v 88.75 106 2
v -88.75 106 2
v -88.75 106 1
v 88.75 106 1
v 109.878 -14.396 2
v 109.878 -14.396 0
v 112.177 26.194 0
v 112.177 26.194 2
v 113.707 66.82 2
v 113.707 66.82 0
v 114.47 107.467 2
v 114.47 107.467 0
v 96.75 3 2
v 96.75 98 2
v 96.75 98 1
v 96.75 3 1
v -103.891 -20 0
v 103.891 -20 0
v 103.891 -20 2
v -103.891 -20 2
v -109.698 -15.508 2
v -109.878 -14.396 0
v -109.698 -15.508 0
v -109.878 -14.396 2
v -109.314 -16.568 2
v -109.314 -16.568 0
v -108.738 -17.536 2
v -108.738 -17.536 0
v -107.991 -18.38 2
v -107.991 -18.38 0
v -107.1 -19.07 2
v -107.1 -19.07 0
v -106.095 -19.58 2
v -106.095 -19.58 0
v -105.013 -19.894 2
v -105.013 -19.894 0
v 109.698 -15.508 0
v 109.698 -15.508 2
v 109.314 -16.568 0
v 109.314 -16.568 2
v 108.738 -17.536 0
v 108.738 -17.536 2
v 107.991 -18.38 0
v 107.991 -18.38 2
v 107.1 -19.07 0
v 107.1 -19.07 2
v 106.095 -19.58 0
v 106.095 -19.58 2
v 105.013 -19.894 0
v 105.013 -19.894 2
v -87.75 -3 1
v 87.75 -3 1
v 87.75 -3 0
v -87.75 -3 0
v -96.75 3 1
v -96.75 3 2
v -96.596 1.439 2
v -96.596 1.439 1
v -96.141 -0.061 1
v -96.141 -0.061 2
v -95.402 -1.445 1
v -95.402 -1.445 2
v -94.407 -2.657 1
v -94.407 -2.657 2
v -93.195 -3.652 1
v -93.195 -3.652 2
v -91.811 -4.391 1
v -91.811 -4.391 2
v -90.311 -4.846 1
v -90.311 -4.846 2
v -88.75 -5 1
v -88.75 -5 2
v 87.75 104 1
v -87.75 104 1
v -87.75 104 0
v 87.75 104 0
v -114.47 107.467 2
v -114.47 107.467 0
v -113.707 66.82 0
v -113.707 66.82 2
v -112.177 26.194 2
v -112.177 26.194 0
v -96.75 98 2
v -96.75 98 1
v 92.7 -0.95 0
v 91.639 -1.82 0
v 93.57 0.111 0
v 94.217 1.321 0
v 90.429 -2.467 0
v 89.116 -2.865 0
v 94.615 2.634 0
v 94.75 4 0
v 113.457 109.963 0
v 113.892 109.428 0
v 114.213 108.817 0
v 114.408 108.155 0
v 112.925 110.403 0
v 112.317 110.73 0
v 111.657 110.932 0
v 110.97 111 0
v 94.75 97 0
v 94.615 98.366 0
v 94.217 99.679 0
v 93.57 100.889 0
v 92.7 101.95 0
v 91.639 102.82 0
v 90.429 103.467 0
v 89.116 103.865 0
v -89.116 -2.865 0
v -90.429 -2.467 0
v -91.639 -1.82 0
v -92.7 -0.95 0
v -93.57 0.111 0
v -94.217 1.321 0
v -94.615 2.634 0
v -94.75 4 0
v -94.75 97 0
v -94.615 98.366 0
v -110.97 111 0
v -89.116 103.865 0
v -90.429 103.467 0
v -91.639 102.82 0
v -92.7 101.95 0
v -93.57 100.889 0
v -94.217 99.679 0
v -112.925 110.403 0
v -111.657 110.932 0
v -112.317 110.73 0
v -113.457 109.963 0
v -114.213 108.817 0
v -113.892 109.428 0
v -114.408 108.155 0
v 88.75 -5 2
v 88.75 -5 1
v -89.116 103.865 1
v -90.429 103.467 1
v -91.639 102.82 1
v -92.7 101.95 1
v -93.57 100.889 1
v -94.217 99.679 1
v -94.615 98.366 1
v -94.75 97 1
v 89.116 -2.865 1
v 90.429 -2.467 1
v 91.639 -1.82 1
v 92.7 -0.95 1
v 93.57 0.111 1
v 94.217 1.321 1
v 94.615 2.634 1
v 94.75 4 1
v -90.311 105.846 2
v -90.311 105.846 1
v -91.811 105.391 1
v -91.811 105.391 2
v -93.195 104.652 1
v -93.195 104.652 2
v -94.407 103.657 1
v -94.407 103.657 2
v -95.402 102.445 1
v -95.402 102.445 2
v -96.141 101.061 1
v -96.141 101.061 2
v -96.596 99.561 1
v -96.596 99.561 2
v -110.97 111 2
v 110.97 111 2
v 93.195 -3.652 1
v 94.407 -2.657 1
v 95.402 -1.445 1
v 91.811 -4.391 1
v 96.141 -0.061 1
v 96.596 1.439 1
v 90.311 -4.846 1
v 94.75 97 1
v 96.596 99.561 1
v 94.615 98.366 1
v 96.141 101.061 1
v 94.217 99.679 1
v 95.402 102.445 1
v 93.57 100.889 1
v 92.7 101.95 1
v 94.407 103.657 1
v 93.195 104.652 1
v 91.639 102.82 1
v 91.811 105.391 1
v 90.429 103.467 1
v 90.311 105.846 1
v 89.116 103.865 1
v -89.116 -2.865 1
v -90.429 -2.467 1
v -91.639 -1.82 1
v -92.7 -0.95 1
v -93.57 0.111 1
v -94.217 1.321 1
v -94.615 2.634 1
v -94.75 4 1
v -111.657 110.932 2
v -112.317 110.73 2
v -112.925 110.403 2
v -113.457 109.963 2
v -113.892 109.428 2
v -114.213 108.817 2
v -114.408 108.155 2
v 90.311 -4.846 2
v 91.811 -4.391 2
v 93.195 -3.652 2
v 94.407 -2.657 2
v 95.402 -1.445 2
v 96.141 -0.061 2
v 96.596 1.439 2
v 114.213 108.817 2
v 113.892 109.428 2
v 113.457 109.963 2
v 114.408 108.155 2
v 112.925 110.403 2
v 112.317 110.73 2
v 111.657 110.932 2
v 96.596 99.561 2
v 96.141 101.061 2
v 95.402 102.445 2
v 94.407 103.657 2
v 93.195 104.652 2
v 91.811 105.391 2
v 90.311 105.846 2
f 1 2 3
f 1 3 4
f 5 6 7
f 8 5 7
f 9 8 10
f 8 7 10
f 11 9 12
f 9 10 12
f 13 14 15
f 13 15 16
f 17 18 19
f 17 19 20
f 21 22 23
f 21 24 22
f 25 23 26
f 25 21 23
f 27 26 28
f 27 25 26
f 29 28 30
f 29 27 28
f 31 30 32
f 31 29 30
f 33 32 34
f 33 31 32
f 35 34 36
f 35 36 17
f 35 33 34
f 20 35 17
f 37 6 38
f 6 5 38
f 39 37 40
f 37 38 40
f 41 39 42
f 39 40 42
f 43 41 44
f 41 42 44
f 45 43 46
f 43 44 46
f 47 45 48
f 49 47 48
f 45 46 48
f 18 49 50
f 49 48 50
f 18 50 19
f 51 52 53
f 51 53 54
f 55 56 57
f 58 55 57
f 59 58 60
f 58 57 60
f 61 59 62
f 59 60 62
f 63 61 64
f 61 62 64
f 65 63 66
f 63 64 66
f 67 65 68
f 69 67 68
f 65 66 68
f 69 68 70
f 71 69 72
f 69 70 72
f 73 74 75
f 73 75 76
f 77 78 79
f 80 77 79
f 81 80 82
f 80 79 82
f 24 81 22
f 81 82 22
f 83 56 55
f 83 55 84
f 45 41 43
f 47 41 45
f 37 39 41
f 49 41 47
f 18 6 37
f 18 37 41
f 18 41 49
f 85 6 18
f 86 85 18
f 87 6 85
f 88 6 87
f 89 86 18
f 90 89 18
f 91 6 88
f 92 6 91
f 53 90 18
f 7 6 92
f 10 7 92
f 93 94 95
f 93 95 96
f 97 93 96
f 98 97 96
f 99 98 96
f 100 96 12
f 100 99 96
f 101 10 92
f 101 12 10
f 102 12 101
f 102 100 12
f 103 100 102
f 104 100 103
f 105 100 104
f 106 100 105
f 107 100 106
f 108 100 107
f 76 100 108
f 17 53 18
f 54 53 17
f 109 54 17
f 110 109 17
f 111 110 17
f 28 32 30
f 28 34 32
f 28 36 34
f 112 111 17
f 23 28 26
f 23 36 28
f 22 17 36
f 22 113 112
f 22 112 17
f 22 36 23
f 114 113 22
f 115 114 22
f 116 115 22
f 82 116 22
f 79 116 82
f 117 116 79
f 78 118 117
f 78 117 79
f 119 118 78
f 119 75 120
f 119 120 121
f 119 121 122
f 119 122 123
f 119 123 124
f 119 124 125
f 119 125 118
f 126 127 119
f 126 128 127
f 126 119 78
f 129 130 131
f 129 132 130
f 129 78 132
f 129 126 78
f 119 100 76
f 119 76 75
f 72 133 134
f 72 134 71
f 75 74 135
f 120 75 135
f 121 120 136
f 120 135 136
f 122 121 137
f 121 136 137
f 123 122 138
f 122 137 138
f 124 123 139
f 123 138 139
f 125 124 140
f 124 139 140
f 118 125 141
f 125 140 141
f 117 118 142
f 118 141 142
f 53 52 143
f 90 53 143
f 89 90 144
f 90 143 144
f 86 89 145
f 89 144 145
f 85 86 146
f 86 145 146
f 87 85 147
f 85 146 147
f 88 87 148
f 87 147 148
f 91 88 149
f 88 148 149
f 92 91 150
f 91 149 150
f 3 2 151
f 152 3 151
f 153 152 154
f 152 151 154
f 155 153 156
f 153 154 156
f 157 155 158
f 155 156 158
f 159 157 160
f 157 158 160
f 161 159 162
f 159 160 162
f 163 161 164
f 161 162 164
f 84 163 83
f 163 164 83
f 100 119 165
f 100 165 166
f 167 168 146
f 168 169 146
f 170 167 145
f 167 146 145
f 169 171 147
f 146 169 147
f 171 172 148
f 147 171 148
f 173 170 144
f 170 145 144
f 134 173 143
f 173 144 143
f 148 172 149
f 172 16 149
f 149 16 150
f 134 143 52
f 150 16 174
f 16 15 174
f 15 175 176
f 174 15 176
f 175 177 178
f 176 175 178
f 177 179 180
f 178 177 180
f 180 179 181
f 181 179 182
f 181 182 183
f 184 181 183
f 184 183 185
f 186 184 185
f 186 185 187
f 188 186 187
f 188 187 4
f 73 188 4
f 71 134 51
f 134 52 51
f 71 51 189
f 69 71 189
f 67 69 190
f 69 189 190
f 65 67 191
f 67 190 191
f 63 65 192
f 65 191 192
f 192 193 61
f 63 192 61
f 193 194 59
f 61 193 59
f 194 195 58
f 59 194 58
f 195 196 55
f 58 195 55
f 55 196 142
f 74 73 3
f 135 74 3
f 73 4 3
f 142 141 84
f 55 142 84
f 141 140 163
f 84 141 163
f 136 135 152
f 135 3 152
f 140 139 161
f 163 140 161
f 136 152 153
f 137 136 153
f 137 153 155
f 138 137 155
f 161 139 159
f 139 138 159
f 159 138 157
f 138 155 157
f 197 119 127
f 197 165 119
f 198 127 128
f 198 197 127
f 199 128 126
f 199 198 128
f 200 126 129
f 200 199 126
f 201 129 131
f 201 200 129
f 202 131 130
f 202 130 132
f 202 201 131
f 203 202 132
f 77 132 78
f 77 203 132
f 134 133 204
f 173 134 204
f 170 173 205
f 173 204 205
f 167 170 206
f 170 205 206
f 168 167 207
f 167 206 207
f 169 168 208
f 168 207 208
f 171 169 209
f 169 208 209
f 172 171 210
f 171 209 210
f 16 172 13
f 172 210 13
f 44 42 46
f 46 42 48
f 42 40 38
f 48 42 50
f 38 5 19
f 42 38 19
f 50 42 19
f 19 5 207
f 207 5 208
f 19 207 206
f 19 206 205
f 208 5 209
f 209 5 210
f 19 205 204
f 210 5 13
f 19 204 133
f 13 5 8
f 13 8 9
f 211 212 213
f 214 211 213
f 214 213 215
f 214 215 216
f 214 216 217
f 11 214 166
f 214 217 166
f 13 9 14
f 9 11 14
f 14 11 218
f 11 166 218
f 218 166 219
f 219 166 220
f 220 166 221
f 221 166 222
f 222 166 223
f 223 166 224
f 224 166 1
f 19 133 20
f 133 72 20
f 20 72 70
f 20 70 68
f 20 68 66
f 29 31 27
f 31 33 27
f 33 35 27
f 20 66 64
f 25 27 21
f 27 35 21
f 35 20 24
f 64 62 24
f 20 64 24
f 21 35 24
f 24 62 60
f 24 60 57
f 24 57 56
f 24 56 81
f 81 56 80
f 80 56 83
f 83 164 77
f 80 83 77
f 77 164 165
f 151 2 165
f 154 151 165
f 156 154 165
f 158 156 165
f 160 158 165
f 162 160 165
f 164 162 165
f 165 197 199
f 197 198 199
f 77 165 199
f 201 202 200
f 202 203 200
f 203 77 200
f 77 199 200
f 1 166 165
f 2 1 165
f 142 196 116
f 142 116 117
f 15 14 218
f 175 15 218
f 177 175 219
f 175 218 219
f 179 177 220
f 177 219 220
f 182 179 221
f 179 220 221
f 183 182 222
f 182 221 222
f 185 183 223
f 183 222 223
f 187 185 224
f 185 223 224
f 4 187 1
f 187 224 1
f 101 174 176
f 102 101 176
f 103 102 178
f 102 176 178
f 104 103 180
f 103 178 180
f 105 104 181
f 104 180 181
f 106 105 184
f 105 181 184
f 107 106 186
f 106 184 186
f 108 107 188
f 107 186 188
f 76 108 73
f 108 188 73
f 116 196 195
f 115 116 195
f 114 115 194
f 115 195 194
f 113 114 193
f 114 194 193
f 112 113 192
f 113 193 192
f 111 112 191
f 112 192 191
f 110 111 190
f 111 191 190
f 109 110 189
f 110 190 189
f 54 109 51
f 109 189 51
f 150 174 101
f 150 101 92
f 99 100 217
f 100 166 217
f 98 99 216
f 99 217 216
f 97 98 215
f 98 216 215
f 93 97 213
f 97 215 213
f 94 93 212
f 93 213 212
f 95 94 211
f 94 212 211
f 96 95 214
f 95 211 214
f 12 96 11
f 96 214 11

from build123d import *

# Parameters (mm, degrees)
PAD_DEPTH       = 2
FILLET_R        = 3.5
FILLET001_R     = 6
POCKET_DEPTH    = 1
POCKET001_DEPTH = 5


with BuildPart() as part:
    # Sketch → Pad (new body)
    with BuildSketch(Plane.XY):
        with BuildLine():
            Line((-114.5, 111), (114.5, 111))
            ThreePointArc((109.5, -20), (112.998546, 45.461888), (114.5, 111))
            Line((109.5, -20), (-109.5, -20))
            ThreePointArc((-114.5, 111), (-112.998546, 45.461888), (-109.5, -20))
        make_face()
    extrude(amount=PAD_DEPTH)

    # Fillet
    fillet_edges = [part.edges().sort_by_distance(p)[0] for p in [
        (114.5, 111, 1),
        (-114.5, 111, 1),
    ]]
    fillet(fillet_edges, radius=FILLET_R)

    # Fillet001
    fillet001_edges = [part.edges().sort_by_distance(p)[0] for p in [
        (109.5, -20, 1),
        (-109.5, -20, 1),
    ]]
    fillet(fillet001_edges, radius=FILLET001_R)

    # Sketch001 (on Face5 of Fillet001) → Pocket (cut)
    with BuildSketch(Plane.XY.offset(2)):
        with BuildLine():
            Line((-88.75, 106), (88.75, 106))
            ThreePointArc((96.75, 98), (94.406854, 103.656854), (88.75, 106))
            Line((96.75, 98), (96.75, 3))
            ThreePointArc((88.75, -5), (94.406854, -2.656854), (96.75, 3))
            Line((88.75, -5), (-88.75, -5))
            ThreePointArc((-96.75, 3), (-94.406854, -2.656854), (-88.75, -5))
            Line((-96.75, 3), (-96.75, 98))
            ThreePointArc((-88.75, 106), (-94.406854, 103.656854), (-96.75, 98))
        make_face()
    extrude(amount=-POCKET_DEPTH, mode=Mode.SUBTRACT)

    # Sketch002 (on Face19 of Pocket) → Pocket001 (cut)
    with BuildSketch(Plane.XY.offset(1)):
        with BuildLine():
            Line((-87.75, 104), (87.75, 104))
            ThreePointArc((94.75, 97), (92.699747, 101.949747), (87.75, 104))
            Line((94.75, 97), (94.75, 4))
            ThreePointArc((87.75, -3), (92.699747, -0.949747), (94.75, 4))
            Line((87.75, -3), (-87.75, -3))
            ThreePointArc((-94.75, 4), (-92.699747, -0.949747), (-87.75, -3))
            Line((-94.75, 4), (-94.75, 97))
            ThreePointArc((-87.75, 104), (-92.699747, 101.949747), (-94.75, 97))
        make_face()
    extrude(amount=-POCKET001_DEPTH, mode=Mode.SUBTRACT)


solid = part.part
